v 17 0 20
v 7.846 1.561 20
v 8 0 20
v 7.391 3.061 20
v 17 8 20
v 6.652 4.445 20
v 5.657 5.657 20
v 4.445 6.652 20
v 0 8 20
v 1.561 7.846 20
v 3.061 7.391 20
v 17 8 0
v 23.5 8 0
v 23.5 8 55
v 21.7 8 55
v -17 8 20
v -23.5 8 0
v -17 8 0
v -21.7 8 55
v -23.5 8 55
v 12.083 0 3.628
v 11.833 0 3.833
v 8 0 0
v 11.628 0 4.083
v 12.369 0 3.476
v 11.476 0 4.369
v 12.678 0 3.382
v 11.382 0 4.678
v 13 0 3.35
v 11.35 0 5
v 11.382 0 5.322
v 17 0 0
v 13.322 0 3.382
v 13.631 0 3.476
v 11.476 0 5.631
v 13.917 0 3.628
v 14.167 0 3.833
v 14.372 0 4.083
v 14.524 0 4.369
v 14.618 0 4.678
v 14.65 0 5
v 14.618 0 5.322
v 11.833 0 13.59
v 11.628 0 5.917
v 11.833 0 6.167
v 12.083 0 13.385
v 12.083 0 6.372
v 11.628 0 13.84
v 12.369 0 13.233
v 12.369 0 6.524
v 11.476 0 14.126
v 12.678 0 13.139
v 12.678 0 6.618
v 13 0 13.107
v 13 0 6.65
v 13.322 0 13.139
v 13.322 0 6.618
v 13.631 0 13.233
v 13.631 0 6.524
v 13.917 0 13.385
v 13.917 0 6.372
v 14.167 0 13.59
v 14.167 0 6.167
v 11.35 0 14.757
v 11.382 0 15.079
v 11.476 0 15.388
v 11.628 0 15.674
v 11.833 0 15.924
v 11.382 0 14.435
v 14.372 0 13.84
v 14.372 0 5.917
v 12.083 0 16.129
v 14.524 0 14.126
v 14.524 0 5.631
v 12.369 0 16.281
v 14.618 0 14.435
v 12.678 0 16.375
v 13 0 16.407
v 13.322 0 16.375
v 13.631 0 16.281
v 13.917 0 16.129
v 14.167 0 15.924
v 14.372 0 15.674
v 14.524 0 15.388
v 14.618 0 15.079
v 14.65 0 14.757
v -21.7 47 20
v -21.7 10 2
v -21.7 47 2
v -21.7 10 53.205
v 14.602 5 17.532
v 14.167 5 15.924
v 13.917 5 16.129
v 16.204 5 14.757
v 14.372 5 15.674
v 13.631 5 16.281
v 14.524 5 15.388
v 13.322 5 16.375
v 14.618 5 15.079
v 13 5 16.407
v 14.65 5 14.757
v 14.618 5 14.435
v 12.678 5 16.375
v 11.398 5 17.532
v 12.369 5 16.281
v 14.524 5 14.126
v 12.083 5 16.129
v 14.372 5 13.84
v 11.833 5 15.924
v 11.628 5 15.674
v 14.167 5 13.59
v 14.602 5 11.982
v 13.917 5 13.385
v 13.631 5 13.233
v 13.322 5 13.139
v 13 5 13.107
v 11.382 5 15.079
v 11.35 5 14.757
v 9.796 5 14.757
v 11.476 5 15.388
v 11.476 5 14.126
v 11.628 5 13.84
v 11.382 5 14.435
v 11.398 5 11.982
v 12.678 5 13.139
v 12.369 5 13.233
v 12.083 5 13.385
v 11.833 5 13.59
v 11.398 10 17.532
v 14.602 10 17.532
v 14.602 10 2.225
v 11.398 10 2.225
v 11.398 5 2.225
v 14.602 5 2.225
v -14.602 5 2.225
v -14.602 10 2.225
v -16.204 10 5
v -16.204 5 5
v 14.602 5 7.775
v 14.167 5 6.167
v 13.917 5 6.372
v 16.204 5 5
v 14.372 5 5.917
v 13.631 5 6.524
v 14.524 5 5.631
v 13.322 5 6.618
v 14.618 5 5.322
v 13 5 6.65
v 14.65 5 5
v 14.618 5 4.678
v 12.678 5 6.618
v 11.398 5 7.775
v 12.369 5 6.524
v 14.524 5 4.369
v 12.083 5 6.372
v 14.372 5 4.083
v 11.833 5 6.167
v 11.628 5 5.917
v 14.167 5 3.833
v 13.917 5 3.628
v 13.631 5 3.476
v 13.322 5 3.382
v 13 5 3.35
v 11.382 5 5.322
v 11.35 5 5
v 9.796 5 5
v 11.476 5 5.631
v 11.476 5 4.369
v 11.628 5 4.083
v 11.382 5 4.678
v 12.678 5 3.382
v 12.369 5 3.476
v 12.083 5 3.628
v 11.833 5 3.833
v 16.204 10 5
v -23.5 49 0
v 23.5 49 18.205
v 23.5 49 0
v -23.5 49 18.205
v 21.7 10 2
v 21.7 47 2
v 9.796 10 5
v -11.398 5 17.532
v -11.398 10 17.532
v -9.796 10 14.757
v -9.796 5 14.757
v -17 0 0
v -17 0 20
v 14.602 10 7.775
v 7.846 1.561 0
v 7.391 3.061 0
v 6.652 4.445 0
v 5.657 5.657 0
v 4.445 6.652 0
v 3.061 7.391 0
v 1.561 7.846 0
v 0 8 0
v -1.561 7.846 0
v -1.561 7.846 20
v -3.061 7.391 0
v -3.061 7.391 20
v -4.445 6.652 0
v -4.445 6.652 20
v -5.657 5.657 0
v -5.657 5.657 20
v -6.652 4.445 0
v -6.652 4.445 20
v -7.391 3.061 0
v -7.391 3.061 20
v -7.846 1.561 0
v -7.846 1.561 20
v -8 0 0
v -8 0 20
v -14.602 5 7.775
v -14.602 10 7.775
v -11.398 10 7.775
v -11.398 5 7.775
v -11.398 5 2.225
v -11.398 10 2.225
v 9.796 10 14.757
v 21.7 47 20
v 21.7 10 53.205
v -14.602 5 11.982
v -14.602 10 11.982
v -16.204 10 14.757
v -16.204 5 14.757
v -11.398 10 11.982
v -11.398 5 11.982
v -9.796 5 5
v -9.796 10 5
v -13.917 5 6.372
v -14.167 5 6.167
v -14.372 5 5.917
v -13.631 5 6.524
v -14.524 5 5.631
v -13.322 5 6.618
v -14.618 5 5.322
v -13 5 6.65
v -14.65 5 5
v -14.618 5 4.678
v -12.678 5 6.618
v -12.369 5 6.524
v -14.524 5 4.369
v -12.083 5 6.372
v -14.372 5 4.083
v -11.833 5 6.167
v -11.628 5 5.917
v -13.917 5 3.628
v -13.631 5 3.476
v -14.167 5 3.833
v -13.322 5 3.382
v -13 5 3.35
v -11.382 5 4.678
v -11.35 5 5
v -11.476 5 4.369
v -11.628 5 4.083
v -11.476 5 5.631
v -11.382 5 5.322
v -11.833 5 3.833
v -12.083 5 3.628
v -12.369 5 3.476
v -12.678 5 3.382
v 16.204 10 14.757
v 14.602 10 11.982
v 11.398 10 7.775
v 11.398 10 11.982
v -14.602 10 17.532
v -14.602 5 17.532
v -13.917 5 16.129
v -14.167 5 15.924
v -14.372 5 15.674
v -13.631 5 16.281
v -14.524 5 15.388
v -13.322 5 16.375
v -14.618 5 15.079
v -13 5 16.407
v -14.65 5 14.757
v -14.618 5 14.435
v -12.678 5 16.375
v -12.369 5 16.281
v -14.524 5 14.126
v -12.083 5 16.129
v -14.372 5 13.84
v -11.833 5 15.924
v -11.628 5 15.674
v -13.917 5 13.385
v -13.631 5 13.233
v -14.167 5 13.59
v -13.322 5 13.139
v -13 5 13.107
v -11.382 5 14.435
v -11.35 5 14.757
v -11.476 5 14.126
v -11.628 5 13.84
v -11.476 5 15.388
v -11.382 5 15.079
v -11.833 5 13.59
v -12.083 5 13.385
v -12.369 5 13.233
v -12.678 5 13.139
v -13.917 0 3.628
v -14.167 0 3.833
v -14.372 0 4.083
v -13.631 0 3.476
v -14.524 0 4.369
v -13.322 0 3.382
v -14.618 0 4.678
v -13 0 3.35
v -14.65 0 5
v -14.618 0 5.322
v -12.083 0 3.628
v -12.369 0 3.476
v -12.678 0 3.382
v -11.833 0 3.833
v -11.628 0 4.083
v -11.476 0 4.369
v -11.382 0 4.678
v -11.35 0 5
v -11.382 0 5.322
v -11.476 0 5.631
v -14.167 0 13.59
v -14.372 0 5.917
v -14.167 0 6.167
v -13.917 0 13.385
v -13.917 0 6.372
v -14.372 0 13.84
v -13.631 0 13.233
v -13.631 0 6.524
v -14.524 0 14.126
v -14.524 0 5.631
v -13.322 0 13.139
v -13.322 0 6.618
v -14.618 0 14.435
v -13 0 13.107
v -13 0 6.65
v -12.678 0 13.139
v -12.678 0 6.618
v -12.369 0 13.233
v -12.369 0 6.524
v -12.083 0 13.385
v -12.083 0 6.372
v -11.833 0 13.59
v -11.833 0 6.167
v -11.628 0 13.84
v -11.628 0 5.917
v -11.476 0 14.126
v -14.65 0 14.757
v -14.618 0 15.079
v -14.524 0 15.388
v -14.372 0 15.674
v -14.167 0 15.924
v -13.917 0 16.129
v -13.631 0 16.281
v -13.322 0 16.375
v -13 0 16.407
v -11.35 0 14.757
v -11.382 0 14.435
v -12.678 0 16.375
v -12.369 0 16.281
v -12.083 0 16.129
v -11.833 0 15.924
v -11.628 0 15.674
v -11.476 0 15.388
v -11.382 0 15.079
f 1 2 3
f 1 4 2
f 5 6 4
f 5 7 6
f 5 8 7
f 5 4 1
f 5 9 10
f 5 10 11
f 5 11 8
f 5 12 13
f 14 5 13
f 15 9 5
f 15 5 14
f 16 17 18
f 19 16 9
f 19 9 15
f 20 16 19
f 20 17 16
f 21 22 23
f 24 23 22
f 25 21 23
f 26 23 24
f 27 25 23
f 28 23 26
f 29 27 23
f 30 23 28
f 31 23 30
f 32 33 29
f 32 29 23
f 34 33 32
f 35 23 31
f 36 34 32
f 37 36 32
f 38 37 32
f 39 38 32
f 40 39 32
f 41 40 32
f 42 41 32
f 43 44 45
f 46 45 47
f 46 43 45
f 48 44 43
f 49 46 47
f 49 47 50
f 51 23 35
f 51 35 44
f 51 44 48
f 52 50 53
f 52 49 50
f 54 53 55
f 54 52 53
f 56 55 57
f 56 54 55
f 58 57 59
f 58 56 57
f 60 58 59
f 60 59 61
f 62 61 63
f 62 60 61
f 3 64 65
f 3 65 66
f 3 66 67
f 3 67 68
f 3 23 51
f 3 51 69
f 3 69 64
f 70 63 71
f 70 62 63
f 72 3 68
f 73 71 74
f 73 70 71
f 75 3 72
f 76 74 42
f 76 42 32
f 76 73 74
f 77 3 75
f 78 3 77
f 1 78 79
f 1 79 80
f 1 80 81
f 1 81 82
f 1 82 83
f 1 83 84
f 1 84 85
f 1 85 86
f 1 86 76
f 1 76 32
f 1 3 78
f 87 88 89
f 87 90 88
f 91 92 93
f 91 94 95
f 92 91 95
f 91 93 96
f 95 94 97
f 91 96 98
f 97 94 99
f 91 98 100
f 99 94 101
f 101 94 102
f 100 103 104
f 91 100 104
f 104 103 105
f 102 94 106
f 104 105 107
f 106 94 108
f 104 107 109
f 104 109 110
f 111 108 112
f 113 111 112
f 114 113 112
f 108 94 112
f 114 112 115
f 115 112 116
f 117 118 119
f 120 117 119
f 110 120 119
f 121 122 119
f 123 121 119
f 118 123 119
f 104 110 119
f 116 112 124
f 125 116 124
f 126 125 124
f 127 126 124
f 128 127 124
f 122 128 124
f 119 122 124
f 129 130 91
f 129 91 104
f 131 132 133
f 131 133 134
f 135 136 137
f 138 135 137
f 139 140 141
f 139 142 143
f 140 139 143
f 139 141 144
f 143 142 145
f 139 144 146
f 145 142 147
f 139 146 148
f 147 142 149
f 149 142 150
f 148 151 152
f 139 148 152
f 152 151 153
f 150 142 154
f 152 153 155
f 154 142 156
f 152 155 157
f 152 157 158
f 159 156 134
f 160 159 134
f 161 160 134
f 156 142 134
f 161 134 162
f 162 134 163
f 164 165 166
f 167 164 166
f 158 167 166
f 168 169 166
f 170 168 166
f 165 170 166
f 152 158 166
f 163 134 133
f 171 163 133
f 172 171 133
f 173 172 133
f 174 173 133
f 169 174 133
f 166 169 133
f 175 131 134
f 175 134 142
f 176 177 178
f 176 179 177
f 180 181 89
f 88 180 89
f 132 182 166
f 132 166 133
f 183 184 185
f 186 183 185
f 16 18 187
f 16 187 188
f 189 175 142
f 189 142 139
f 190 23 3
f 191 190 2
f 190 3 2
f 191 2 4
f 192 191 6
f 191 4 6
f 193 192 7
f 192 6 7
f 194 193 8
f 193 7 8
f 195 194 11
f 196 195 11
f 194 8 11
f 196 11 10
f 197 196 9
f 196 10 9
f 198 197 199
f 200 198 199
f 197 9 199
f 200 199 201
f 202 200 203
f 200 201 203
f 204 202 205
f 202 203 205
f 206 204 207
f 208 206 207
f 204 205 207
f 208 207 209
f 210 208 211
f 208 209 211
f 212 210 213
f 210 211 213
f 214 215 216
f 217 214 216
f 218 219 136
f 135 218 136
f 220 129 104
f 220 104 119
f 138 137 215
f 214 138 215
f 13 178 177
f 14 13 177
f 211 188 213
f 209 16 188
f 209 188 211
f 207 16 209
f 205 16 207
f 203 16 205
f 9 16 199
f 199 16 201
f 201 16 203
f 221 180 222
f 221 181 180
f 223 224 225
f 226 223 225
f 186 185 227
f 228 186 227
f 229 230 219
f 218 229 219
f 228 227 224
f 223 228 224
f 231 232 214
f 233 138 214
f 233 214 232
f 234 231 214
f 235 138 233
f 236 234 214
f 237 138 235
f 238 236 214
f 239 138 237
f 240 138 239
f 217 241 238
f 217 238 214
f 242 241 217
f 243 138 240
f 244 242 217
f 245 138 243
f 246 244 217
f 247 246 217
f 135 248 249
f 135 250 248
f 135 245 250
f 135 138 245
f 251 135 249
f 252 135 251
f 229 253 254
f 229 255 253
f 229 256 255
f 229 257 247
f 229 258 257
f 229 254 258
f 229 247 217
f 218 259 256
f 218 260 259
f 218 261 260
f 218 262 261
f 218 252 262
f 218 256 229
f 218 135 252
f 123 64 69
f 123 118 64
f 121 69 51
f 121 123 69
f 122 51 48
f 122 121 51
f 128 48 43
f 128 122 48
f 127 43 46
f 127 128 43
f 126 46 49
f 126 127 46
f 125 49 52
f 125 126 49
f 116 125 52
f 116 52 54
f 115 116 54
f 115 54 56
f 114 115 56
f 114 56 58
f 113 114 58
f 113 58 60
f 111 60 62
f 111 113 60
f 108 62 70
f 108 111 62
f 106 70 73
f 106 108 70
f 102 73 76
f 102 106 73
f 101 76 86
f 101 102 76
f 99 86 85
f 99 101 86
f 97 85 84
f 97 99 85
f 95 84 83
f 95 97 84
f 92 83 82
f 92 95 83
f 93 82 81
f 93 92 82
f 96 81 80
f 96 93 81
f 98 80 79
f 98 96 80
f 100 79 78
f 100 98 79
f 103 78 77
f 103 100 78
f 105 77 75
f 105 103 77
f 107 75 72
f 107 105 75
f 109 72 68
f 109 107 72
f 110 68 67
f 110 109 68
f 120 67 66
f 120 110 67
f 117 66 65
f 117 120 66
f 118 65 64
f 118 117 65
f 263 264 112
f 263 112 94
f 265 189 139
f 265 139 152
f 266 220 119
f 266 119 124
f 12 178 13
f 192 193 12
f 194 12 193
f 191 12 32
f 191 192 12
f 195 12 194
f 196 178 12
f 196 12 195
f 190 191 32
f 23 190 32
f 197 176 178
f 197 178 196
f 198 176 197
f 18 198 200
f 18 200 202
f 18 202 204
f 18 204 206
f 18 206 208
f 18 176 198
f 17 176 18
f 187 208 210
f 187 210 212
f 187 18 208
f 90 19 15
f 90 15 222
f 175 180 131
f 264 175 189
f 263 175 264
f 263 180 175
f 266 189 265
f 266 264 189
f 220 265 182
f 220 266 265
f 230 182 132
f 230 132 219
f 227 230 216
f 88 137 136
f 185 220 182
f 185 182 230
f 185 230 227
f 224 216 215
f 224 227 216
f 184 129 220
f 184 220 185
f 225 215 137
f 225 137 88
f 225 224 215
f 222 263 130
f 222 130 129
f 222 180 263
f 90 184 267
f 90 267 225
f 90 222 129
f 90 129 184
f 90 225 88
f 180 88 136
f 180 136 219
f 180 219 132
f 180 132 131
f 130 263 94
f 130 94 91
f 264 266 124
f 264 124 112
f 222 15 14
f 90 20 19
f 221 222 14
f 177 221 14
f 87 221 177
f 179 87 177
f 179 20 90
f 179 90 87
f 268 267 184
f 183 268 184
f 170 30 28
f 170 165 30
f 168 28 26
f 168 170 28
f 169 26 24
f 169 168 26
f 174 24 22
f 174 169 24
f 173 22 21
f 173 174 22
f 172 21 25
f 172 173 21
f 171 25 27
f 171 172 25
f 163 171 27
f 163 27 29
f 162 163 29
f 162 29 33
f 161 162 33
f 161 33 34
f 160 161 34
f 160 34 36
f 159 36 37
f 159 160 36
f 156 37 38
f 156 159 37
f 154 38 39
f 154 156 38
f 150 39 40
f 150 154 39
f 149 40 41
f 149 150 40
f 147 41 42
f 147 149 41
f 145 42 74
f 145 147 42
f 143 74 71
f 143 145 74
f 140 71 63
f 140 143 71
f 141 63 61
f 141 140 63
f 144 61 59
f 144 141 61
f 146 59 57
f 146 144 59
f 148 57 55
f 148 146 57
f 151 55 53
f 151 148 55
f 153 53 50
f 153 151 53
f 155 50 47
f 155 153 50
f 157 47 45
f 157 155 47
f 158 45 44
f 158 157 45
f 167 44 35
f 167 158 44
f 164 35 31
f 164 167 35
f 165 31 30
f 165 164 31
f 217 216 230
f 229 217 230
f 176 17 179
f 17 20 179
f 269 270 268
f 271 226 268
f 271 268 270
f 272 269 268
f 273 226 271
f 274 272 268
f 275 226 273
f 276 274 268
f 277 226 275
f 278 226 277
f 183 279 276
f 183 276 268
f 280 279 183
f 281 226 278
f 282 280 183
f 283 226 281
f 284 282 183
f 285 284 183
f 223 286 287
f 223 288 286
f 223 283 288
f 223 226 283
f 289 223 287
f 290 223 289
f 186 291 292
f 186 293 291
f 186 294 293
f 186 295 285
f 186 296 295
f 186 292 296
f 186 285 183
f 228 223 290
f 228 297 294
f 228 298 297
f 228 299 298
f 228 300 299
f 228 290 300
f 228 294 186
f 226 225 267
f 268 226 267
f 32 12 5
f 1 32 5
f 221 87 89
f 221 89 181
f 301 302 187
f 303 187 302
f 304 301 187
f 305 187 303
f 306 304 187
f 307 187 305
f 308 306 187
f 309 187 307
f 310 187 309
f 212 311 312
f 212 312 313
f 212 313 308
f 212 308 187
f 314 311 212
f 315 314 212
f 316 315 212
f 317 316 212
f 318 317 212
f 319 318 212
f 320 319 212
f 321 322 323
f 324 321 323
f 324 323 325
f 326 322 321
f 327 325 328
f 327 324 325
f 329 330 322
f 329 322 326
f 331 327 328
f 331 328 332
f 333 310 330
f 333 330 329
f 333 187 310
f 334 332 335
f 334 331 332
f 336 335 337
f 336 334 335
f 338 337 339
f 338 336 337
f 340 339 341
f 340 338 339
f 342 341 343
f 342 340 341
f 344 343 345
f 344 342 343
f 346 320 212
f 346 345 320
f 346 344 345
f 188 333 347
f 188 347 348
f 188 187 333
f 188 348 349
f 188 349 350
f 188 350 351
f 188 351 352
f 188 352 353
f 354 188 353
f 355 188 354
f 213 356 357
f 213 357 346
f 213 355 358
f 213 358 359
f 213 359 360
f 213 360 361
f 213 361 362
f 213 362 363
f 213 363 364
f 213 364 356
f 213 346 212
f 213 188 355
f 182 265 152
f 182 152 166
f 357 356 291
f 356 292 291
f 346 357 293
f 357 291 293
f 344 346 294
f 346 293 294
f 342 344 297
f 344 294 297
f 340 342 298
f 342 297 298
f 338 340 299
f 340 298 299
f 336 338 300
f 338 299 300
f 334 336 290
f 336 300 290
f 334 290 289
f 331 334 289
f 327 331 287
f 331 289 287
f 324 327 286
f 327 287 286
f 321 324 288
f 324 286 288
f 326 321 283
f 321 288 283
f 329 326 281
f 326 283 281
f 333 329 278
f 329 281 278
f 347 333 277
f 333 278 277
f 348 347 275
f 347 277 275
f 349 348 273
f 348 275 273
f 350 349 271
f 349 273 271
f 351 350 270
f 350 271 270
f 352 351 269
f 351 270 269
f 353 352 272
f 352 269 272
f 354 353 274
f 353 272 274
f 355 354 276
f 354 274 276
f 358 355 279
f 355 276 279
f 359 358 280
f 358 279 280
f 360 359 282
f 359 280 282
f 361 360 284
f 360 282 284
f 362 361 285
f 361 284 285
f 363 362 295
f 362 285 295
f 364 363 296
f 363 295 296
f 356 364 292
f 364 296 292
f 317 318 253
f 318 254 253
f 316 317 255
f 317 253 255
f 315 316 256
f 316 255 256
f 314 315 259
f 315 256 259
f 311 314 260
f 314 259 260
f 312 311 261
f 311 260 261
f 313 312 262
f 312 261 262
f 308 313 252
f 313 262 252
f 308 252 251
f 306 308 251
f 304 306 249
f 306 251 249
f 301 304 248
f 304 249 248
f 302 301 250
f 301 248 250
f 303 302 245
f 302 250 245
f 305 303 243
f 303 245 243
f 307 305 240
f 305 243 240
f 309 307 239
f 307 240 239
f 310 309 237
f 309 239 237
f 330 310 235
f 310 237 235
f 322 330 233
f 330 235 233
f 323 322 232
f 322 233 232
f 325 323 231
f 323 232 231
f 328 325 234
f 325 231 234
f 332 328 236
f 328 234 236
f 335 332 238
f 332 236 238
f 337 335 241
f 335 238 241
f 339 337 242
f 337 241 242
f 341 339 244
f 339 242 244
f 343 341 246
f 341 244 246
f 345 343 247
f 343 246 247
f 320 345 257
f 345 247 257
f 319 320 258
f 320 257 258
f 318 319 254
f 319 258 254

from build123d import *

# Parameters (mm, degrees)
EXTRUDE_1_DEPTH             = 43.4
EXTRUDE_2_DEPTH             = 1.8
CUT_EXTRUDE_1_DEPTH         = 43.4
EXTRUDE_3_DEPTH             = 43.4
EXTRUDE_4_DEPTH             = 16.205128205
SKETCH_6_W                  = 45.2
SKETCH_6_H                  = 41
EXTRUDE_5_DEPTH             = 2
SKETCH_7_W                  = 34
SKETCH_7_H                  = 20
EXTRUDE_6_DEPTH             = 8
EXTRUDE_7_DEPTH             = 1.8
HOLE_WIZARD_3_3_3_3_2_D     = 3.3
HOLE_WIZARD_3_3_3_3_2_DEPTH = 10
HOLE_WIZARD_16_0_16_1_D     = 16
HOLE_WIZARD_16_0_16_1_DEPTH = 55
SKETCH_19_R                 = 1.65
CUT_EXTRUDE_6_DEPTH         = 5


with BuildPart() as part:
    # 草图1 → 凸台-拉伸1 (new body)
    with BuildSketch(Plane(origin=(21.7, 0, 0), x_dir=(0, 0, -1), z_dir=(1, 0, 0))):
        Polygon((-18.205128205, 8), (-18.205128205, 49), (-55, 8), align=None)
    extrude(amount=-EXTRUDE_1_DEPTH)

    # 草图2 → 凸台-拉伸2 (add)
    with BuildSketch(Plane.ZY.offset(21.7)):
        Polygon((18.205128205, 8), (18.205128205, 49), (55, 8), align=None)
    extrude(amount=EXTRUDE_2_DEPTH)

    # 草图3 → 切除-拉伸1 (cut)
    with BuildSketch(Plane(origin=(21.7, 0, 0), x_dir=(0, 0, -1), z_dir=(1, 0, 0))):
        Polygon((-18.205128205, 8), (-18.205128205, 47), (-20, 47), (-55, 8), align=None)
    extrude(amount=-CUT_EXTRUDE_1_DEPTH, mode=Mode.SUBTRACT)

    # 草图4 → 凸台-拉伸3 (add)
    with BuildSketch(Plane(origin=(-21.7, 0, 0), x_dir=(0, 0, -1), z_dir=(1, 0, 0))):
        Polygon((-18.205128205, 10), (-18.205128205, 8), (-55, 8), (-53.205128205, 10), align=None)
    extrude(amount=EXTRUDE_3_DEPTH)

    # 草图5 → 凸台-拉伸4 (add)
    with BuildSketch(Plane(origin=(0, 0, 18.205128205), x_dir=(-1, 0, 0), z_dir=(0, 0, -1))):
        Polygon((21.7, 10), (21.7, 47), (-21.7, 47), (-21.7, 49), (23.5, 49), (23.5, 8), (-21.7, 8), (-21.7, 10), align=None)
    extrude(amount=EXTRUDE_4_DEPTH)

    # 草图6 → 凸台-拉伸5 (add)
    with BuildSketch(Plane(origin=(0, 0, 2), x_dir=(-1, 0, 0), z_dir=(0, 0, -1))):
        with Locations((0.9, 28.5)):
            Rectangle(SKETCH_6_W, SKETCH_6_H)
    extrude(amount=EXTRUDE_5_DEPTH)

    # 草图7 → 凸台-拉伸6 (add)
    with BuildSketch(Plane.XZ.offset(-8)):
        with Locations((0, 10)):
            Rectangle(SKETCH_7_W, SKETCH_7_H)
    extrude(amount=EXTRUDE_6_DEPTH)

    # 草图10 → 凸台-拉伸7 (add)
    with BuildSketch(Plane(origin=(21.7, 0, 0), x_dir=(0, 0, -1), z_dir=(1, 0, 0))):
        Polygon((0, 49), (0, 8), (-55, 8), (-18.205128205, 49), align=None)
    extrude(amount=EXTRUDE_7_DEPTH)

    # Ø3.3 (3.3) 直径孔2
    with Locations(Plane(origin=(0, 0, 0), x_dir=(-1, 0, 0), z_dir=(0, -1, 0))):
        with Locations((13, -5), (13, -14.75698348)):
            hole_wizard_3_3_3_3_2 = Hole(HOLE_WIZARD_3_3_3_3_2_D / 2, depth=HOLE_WIZARD_3_3_3_3_2_DEPTH)

    # Ø16.0 (16) 直径孔1
    with Locations(Plane(origin=(0, 0, 0), x_dir=(-1, 0, 0), z_dir=(0, 0, -1))):
        with Locations((0, 0)):
            Hole(HOLE_WIZARD_16_0_16_1_D / 2, depth=HOLE_WIZARD_16_0_16_1_DEPTH)

    # 草图19 → 切除-拉伸6 (cut)
    # profile 1 of 2: a face of its own
    with BuildSketch(Plane(origin=(0, 10, 0), x_dir=(1, 0, 0), z_dir=(0, 1, 0))):
        Polygon((-9.795706006, -14.75698348), (-11.397853003, -11.98198348), (-14.602146997, -11.98198348), (-16.204293994, -14.75698348), (-14.602146997, -17.53198348), (-11.397853003, -17.53198348), align=None)
        with Locations(Location((-13, -14.75698348, 0), (0, 0, 90))):
            Circle(SKETCH_19_R, mode=Mode.SUBTRACT)
    # profile 2 of 2: a face of its own
    with BuildSketch(Plane(origin=(0, 10, 0), x_dir=(1, 0, 0), z_dir=(0, 1, 0))):
        Polygon((-9.795706006, -5), (-11.397853003, -2.225), (-14.602146997, -2.225), (-16.204293994, -5), (-14.602146997, -7.775), (-11.397853003, -7.775), align=None)
        with Locations(Location((-13, -5, 0), (0, 0, 90))):
            Circle(SKETCH_19_R, mode=Mode.SUBTRACT)
    cut_extrude_6 = extrude(amount=-CUT_EXTRUDE_6_DEPTH, mode=Mode.SUBTRACT)

    # 镜向1: Ø3.3 (3.3) 直径孔2, 切除-拉伸6 across plane
    add(hole_wizard_3_3_3_3_2.mirror(Plane.ZY), mode=Mode.SUBTRACT)
    add(cut_extrude_6.mirror(Plane.ZY), mode=Mode.SUBTRACT)


solid = part.part
